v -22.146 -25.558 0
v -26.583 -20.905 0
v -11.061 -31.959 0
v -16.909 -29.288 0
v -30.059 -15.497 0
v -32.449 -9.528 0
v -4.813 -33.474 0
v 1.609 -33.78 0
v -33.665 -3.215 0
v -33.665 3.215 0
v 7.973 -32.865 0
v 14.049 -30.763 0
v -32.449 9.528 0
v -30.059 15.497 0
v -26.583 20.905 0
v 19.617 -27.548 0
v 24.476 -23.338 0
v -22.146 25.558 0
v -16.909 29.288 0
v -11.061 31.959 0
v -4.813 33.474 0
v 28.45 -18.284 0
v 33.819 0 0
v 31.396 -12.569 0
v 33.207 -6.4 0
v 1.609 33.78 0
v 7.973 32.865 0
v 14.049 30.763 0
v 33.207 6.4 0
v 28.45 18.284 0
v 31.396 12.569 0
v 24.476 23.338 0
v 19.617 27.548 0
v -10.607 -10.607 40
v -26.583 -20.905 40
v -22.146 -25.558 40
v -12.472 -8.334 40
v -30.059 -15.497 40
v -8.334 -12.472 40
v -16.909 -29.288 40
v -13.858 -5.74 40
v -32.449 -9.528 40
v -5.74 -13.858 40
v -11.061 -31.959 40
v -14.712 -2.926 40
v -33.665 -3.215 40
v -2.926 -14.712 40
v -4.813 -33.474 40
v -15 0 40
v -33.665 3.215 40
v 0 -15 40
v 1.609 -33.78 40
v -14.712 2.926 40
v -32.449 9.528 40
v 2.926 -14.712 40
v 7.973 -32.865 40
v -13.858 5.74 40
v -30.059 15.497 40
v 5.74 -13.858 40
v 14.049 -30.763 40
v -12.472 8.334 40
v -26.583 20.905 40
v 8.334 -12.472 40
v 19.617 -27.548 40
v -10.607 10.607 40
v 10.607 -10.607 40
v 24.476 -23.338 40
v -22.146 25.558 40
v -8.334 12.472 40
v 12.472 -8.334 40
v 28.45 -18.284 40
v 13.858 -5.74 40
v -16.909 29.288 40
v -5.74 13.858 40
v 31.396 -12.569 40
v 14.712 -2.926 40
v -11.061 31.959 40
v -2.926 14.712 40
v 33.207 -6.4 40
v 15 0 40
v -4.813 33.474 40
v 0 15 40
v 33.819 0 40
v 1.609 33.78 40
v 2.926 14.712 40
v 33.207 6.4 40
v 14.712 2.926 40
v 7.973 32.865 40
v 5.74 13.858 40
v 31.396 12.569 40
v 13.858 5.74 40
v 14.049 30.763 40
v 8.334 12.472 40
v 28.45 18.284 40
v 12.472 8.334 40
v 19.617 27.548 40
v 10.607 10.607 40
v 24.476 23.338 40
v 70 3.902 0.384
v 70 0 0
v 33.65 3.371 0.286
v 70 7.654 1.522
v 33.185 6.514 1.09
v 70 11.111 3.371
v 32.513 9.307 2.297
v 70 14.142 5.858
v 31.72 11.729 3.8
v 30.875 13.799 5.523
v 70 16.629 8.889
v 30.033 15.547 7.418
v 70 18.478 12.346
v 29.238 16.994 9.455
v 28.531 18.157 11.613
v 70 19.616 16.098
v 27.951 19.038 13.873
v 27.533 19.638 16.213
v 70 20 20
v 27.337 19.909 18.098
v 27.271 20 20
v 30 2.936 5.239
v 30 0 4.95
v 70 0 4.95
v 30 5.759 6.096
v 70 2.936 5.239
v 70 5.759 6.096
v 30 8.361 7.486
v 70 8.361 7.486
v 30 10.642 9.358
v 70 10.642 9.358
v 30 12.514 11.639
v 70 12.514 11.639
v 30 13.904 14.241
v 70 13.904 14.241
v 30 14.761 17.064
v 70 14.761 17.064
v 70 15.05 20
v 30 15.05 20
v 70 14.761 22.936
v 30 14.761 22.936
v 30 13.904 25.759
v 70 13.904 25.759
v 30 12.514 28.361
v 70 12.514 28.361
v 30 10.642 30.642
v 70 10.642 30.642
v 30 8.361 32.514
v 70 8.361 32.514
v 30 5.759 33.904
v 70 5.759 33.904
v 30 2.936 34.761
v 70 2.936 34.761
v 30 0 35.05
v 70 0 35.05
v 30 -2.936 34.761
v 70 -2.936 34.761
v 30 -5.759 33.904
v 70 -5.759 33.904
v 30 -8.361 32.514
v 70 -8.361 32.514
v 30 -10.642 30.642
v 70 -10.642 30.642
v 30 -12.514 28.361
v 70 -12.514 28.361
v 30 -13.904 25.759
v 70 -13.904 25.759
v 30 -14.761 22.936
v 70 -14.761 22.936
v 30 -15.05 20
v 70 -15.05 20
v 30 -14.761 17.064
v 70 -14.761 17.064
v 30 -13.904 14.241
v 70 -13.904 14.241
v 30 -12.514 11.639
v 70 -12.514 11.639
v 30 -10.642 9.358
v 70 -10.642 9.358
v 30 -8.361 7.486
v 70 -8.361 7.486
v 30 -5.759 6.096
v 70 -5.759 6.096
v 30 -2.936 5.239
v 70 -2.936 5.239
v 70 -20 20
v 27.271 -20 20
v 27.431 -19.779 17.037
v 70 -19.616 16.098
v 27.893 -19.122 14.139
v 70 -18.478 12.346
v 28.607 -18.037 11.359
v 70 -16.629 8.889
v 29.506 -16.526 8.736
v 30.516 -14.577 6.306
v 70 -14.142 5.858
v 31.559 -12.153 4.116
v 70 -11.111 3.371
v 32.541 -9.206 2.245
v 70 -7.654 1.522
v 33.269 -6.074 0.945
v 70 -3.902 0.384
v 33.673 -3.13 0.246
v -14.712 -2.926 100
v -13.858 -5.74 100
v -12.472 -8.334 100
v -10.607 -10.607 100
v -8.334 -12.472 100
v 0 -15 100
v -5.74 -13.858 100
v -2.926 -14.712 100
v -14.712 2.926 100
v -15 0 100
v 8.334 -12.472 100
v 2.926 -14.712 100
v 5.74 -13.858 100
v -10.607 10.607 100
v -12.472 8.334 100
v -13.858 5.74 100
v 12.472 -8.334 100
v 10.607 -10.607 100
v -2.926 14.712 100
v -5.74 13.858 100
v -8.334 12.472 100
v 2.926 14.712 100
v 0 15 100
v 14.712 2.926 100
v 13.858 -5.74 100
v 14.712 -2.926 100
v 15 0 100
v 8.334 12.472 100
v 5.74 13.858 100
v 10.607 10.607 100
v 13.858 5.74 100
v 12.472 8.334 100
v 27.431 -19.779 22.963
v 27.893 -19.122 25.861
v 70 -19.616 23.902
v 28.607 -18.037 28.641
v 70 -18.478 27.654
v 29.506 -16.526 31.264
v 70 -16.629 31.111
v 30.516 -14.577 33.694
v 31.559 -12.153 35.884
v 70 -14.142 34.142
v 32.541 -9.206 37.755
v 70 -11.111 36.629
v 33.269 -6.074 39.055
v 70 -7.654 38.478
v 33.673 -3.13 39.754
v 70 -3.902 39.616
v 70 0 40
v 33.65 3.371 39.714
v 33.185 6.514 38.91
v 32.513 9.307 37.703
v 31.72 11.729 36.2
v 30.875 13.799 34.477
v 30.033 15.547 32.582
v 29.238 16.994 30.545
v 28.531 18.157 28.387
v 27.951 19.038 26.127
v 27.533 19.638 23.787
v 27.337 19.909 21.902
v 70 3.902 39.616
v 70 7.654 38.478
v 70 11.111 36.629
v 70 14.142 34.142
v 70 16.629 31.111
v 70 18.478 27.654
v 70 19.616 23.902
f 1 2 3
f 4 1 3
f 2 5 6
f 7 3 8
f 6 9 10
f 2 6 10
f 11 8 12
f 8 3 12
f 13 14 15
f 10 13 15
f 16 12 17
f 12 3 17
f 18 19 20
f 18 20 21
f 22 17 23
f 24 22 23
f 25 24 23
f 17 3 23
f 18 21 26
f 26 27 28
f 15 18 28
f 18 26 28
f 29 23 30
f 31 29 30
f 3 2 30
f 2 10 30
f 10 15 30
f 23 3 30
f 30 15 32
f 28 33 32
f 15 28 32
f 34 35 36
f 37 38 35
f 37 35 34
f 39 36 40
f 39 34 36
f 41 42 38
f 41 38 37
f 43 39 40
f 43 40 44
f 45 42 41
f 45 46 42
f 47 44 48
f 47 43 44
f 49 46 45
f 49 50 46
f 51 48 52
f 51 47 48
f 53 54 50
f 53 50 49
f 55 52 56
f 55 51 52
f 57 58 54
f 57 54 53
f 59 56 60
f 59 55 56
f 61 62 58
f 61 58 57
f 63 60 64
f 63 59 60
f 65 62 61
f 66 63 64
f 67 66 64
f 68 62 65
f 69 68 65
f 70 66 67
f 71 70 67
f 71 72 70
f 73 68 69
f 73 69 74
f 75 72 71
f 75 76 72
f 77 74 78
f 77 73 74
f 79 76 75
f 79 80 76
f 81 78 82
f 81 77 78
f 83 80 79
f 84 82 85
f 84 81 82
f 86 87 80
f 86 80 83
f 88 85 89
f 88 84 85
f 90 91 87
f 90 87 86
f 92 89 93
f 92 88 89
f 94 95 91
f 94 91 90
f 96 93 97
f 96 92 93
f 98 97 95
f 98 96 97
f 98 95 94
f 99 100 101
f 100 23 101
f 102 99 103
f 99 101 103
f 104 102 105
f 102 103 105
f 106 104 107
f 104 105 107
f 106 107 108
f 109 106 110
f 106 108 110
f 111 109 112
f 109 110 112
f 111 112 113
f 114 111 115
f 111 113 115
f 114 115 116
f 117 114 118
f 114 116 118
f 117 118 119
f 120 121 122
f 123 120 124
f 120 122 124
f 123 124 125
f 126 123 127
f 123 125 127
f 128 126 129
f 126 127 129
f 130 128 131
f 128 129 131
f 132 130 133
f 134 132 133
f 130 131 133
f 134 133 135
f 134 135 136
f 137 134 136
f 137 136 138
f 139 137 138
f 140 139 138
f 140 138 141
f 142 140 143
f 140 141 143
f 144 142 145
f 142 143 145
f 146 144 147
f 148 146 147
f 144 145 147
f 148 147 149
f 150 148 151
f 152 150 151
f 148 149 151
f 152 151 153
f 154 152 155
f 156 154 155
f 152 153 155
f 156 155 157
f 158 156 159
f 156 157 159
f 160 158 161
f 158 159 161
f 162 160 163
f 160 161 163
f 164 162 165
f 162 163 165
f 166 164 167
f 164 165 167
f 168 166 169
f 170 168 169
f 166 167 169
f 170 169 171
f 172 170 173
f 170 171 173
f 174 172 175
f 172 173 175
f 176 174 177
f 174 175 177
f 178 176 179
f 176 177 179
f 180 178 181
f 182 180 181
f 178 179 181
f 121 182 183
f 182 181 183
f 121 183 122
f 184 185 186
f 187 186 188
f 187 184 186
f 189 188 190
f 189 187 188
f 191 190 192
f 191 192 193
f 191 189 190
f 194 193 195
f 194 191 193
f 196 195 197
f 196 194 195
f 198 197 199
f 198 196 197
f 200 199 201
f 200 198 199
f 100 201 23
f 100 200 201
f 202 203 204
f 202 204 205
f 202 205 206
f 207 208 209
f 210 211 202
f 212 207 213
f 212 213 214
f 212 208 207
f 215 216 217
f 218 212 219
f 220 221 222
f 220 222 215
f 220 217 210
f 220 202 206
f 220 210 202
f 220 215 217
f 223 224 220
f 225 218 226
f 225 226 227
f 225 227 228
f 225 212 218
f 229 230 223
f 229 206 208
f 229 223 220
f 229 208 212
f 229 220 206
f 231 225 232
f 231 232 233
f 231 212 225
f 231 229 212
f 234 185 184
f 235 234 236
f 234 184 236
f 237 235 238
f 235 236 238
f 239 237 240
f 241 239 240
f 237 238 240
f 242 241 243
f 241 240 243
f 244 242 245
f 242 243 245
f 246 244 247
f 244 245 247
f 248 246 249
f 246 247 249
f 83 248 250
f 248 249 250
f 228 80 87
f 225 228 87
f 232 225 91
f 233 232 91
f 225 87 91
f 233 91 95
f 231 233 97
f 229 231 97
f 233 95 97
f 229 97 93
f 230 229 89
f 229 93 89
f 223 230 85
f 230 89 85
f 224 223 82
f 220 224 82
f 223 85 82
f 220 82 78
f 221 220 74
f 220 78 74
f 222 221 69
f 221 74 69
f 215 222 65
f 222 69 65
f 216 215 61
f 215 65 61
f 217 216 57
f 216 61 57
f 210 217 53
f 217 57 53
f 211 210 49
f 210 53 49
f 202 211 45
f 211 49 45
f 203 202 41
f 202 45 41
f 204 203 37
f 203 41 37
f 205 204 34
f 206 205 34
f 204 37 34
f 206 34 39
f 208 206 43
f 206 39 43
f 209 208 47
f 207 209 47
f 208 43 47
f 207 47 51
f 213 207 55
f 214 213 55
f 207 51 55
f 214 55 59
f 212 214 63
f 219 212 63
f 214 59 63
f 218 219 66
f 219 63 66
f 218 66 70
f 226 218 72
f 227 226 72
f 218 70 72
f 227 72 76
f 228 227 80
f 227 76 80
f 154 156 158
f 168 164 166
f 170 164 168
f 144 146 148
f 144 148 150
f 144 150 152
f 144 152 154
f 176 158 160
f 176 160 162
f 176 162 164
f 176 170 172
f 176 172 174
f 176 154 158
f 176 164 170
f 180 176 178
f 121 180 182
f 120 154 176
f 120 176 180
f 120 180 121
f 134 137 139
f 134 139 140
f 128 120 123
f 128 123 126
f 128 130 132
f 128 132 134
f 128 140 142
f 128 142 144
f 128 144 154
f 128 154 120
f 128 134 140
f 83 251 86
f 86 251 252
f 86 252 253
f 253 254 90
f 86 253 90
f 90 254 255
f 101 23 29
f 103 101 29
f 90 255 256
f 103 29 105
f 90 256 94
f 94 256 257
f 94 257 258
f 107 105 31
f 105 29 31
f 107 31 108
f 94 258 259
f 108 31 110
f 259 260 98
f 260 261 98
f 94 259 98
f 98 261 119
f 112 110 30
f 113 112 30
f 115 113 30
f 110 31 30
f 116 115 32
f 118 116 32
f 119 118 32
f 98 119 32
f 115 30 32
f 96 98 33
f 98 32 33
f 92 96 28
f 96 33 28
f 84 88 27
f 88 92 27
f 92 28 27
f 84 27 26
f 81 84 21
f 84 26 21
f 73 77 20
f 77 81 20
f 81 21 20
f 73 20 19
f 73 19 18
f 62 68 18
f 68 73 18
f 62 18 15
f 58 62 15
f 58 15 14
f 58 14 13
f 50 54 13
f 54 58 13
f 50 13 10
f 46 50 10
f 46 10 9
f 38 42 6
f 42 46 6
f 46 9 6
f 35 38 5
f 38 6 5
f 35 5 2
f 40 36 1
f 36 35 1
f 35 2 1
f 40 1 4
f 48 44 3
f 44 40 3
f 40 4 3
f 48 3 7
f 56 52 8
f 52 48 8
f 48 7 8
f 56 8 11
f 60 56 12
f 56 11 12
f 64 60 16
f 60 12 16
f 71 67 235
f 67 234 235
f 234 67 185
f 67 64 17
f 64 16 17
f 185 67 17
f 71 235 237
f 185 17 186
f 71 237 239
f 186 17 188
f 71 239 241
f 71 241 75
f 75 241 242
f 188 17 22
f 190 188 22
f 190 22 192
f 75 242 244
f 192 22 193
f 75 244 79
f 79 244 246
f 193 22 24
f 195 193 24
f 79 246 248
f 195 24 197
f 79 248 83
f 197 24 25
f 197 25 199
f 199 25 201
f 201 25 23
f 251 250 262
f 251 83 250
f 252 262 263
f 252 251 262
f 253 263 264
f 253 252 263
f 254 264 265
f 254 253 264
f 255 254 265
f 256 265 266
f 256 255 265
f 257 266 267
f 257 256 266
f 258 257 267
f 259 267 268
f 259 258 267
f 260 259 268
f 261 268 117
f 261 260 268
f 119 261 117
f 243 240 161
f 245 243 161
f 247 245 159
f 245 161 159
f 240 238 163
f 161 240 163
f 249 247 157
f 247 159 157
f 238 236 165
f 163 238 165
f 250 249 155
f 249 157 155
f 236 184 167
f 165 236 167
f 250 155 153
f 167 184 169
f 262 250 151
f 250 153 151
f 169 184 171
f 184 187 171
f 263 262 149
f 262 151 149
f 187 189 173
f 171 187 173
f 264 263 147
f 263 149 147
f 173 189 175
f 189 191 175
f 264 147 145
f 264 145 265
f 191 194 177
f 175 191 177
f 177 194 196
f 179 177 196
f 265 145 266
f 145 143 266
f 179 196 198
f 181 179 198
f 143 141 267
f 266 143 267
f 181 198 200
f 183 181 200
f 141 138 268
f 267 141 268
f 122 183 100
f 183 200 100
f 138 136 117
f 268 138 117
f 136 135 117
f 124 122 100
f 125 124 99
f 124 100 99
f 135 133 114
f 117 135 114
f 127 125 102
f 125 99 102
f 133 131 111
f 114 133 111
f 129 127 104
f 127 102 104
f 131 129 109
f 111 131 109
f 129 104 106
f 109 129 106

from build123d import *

# Parameters (mm, degrees)
BOSS_EXTRUDE1_DEPTH = 40
SKETCH2_R           = 15.05
CUT_EXTRUDE1_DEPTH  = 40
FILLET1_R           = 20
SKETCH3_R           = 15
BOSS_EXTRUDE2_DEPTH = 60


with BuildPart() as part:
    # Sketch1 → Boss-Extrude1 (new body)
    with BuildSketch(Plane.XY):
        with BuildLine():
            Line((27.270825141, -20), (70, -20))
            Line((70, -20), (70, 20))
            Line((70, 20), (27.270825141, 20))
            ThreePointArc((27.270825141, 20), (-33.818602926, 0), (27.270825141, -20))
        make_face()
    extrude(amount=BOSS_EXTRUDE1_DEPTH)

    # Sketch2 → Cut-Extrude1 (cut)
    with BuildSketch(Plane(origin=(70, 0, 0), x_dir=(0, 0, -1), z_dir=(1, 0, 0))):
        with Locations((-20, 0)):
            Circle(SKETCH2_R)
    extrude(amount=-CUT_EXTRUDE1_DEPTH, mode=Mode.SUBTRACT)

    # Fillet1
    fillet1_edges = [part.edges().sort_by_distance(p)[0] for p in [
        (48.635412571, 20, 40),
        (48.635412571, -20, 40),
        (48.635412571, -20, 0),
        (48.635412571, 20, 0),
    ]]
    fillet(fillet1_edges, radius=FILLET1_R - 0.0001)  # a hair under: the kernel refuses the full size

    # Sketch3 → Boss-Extrude2 (add)
    with BuildSketch(Plane.XY.offset(40)):
        Circle(SKETCH3_R)
    extrude(amount=BOSS_EXTRUDE2_DEPTH)


solid = part.part
